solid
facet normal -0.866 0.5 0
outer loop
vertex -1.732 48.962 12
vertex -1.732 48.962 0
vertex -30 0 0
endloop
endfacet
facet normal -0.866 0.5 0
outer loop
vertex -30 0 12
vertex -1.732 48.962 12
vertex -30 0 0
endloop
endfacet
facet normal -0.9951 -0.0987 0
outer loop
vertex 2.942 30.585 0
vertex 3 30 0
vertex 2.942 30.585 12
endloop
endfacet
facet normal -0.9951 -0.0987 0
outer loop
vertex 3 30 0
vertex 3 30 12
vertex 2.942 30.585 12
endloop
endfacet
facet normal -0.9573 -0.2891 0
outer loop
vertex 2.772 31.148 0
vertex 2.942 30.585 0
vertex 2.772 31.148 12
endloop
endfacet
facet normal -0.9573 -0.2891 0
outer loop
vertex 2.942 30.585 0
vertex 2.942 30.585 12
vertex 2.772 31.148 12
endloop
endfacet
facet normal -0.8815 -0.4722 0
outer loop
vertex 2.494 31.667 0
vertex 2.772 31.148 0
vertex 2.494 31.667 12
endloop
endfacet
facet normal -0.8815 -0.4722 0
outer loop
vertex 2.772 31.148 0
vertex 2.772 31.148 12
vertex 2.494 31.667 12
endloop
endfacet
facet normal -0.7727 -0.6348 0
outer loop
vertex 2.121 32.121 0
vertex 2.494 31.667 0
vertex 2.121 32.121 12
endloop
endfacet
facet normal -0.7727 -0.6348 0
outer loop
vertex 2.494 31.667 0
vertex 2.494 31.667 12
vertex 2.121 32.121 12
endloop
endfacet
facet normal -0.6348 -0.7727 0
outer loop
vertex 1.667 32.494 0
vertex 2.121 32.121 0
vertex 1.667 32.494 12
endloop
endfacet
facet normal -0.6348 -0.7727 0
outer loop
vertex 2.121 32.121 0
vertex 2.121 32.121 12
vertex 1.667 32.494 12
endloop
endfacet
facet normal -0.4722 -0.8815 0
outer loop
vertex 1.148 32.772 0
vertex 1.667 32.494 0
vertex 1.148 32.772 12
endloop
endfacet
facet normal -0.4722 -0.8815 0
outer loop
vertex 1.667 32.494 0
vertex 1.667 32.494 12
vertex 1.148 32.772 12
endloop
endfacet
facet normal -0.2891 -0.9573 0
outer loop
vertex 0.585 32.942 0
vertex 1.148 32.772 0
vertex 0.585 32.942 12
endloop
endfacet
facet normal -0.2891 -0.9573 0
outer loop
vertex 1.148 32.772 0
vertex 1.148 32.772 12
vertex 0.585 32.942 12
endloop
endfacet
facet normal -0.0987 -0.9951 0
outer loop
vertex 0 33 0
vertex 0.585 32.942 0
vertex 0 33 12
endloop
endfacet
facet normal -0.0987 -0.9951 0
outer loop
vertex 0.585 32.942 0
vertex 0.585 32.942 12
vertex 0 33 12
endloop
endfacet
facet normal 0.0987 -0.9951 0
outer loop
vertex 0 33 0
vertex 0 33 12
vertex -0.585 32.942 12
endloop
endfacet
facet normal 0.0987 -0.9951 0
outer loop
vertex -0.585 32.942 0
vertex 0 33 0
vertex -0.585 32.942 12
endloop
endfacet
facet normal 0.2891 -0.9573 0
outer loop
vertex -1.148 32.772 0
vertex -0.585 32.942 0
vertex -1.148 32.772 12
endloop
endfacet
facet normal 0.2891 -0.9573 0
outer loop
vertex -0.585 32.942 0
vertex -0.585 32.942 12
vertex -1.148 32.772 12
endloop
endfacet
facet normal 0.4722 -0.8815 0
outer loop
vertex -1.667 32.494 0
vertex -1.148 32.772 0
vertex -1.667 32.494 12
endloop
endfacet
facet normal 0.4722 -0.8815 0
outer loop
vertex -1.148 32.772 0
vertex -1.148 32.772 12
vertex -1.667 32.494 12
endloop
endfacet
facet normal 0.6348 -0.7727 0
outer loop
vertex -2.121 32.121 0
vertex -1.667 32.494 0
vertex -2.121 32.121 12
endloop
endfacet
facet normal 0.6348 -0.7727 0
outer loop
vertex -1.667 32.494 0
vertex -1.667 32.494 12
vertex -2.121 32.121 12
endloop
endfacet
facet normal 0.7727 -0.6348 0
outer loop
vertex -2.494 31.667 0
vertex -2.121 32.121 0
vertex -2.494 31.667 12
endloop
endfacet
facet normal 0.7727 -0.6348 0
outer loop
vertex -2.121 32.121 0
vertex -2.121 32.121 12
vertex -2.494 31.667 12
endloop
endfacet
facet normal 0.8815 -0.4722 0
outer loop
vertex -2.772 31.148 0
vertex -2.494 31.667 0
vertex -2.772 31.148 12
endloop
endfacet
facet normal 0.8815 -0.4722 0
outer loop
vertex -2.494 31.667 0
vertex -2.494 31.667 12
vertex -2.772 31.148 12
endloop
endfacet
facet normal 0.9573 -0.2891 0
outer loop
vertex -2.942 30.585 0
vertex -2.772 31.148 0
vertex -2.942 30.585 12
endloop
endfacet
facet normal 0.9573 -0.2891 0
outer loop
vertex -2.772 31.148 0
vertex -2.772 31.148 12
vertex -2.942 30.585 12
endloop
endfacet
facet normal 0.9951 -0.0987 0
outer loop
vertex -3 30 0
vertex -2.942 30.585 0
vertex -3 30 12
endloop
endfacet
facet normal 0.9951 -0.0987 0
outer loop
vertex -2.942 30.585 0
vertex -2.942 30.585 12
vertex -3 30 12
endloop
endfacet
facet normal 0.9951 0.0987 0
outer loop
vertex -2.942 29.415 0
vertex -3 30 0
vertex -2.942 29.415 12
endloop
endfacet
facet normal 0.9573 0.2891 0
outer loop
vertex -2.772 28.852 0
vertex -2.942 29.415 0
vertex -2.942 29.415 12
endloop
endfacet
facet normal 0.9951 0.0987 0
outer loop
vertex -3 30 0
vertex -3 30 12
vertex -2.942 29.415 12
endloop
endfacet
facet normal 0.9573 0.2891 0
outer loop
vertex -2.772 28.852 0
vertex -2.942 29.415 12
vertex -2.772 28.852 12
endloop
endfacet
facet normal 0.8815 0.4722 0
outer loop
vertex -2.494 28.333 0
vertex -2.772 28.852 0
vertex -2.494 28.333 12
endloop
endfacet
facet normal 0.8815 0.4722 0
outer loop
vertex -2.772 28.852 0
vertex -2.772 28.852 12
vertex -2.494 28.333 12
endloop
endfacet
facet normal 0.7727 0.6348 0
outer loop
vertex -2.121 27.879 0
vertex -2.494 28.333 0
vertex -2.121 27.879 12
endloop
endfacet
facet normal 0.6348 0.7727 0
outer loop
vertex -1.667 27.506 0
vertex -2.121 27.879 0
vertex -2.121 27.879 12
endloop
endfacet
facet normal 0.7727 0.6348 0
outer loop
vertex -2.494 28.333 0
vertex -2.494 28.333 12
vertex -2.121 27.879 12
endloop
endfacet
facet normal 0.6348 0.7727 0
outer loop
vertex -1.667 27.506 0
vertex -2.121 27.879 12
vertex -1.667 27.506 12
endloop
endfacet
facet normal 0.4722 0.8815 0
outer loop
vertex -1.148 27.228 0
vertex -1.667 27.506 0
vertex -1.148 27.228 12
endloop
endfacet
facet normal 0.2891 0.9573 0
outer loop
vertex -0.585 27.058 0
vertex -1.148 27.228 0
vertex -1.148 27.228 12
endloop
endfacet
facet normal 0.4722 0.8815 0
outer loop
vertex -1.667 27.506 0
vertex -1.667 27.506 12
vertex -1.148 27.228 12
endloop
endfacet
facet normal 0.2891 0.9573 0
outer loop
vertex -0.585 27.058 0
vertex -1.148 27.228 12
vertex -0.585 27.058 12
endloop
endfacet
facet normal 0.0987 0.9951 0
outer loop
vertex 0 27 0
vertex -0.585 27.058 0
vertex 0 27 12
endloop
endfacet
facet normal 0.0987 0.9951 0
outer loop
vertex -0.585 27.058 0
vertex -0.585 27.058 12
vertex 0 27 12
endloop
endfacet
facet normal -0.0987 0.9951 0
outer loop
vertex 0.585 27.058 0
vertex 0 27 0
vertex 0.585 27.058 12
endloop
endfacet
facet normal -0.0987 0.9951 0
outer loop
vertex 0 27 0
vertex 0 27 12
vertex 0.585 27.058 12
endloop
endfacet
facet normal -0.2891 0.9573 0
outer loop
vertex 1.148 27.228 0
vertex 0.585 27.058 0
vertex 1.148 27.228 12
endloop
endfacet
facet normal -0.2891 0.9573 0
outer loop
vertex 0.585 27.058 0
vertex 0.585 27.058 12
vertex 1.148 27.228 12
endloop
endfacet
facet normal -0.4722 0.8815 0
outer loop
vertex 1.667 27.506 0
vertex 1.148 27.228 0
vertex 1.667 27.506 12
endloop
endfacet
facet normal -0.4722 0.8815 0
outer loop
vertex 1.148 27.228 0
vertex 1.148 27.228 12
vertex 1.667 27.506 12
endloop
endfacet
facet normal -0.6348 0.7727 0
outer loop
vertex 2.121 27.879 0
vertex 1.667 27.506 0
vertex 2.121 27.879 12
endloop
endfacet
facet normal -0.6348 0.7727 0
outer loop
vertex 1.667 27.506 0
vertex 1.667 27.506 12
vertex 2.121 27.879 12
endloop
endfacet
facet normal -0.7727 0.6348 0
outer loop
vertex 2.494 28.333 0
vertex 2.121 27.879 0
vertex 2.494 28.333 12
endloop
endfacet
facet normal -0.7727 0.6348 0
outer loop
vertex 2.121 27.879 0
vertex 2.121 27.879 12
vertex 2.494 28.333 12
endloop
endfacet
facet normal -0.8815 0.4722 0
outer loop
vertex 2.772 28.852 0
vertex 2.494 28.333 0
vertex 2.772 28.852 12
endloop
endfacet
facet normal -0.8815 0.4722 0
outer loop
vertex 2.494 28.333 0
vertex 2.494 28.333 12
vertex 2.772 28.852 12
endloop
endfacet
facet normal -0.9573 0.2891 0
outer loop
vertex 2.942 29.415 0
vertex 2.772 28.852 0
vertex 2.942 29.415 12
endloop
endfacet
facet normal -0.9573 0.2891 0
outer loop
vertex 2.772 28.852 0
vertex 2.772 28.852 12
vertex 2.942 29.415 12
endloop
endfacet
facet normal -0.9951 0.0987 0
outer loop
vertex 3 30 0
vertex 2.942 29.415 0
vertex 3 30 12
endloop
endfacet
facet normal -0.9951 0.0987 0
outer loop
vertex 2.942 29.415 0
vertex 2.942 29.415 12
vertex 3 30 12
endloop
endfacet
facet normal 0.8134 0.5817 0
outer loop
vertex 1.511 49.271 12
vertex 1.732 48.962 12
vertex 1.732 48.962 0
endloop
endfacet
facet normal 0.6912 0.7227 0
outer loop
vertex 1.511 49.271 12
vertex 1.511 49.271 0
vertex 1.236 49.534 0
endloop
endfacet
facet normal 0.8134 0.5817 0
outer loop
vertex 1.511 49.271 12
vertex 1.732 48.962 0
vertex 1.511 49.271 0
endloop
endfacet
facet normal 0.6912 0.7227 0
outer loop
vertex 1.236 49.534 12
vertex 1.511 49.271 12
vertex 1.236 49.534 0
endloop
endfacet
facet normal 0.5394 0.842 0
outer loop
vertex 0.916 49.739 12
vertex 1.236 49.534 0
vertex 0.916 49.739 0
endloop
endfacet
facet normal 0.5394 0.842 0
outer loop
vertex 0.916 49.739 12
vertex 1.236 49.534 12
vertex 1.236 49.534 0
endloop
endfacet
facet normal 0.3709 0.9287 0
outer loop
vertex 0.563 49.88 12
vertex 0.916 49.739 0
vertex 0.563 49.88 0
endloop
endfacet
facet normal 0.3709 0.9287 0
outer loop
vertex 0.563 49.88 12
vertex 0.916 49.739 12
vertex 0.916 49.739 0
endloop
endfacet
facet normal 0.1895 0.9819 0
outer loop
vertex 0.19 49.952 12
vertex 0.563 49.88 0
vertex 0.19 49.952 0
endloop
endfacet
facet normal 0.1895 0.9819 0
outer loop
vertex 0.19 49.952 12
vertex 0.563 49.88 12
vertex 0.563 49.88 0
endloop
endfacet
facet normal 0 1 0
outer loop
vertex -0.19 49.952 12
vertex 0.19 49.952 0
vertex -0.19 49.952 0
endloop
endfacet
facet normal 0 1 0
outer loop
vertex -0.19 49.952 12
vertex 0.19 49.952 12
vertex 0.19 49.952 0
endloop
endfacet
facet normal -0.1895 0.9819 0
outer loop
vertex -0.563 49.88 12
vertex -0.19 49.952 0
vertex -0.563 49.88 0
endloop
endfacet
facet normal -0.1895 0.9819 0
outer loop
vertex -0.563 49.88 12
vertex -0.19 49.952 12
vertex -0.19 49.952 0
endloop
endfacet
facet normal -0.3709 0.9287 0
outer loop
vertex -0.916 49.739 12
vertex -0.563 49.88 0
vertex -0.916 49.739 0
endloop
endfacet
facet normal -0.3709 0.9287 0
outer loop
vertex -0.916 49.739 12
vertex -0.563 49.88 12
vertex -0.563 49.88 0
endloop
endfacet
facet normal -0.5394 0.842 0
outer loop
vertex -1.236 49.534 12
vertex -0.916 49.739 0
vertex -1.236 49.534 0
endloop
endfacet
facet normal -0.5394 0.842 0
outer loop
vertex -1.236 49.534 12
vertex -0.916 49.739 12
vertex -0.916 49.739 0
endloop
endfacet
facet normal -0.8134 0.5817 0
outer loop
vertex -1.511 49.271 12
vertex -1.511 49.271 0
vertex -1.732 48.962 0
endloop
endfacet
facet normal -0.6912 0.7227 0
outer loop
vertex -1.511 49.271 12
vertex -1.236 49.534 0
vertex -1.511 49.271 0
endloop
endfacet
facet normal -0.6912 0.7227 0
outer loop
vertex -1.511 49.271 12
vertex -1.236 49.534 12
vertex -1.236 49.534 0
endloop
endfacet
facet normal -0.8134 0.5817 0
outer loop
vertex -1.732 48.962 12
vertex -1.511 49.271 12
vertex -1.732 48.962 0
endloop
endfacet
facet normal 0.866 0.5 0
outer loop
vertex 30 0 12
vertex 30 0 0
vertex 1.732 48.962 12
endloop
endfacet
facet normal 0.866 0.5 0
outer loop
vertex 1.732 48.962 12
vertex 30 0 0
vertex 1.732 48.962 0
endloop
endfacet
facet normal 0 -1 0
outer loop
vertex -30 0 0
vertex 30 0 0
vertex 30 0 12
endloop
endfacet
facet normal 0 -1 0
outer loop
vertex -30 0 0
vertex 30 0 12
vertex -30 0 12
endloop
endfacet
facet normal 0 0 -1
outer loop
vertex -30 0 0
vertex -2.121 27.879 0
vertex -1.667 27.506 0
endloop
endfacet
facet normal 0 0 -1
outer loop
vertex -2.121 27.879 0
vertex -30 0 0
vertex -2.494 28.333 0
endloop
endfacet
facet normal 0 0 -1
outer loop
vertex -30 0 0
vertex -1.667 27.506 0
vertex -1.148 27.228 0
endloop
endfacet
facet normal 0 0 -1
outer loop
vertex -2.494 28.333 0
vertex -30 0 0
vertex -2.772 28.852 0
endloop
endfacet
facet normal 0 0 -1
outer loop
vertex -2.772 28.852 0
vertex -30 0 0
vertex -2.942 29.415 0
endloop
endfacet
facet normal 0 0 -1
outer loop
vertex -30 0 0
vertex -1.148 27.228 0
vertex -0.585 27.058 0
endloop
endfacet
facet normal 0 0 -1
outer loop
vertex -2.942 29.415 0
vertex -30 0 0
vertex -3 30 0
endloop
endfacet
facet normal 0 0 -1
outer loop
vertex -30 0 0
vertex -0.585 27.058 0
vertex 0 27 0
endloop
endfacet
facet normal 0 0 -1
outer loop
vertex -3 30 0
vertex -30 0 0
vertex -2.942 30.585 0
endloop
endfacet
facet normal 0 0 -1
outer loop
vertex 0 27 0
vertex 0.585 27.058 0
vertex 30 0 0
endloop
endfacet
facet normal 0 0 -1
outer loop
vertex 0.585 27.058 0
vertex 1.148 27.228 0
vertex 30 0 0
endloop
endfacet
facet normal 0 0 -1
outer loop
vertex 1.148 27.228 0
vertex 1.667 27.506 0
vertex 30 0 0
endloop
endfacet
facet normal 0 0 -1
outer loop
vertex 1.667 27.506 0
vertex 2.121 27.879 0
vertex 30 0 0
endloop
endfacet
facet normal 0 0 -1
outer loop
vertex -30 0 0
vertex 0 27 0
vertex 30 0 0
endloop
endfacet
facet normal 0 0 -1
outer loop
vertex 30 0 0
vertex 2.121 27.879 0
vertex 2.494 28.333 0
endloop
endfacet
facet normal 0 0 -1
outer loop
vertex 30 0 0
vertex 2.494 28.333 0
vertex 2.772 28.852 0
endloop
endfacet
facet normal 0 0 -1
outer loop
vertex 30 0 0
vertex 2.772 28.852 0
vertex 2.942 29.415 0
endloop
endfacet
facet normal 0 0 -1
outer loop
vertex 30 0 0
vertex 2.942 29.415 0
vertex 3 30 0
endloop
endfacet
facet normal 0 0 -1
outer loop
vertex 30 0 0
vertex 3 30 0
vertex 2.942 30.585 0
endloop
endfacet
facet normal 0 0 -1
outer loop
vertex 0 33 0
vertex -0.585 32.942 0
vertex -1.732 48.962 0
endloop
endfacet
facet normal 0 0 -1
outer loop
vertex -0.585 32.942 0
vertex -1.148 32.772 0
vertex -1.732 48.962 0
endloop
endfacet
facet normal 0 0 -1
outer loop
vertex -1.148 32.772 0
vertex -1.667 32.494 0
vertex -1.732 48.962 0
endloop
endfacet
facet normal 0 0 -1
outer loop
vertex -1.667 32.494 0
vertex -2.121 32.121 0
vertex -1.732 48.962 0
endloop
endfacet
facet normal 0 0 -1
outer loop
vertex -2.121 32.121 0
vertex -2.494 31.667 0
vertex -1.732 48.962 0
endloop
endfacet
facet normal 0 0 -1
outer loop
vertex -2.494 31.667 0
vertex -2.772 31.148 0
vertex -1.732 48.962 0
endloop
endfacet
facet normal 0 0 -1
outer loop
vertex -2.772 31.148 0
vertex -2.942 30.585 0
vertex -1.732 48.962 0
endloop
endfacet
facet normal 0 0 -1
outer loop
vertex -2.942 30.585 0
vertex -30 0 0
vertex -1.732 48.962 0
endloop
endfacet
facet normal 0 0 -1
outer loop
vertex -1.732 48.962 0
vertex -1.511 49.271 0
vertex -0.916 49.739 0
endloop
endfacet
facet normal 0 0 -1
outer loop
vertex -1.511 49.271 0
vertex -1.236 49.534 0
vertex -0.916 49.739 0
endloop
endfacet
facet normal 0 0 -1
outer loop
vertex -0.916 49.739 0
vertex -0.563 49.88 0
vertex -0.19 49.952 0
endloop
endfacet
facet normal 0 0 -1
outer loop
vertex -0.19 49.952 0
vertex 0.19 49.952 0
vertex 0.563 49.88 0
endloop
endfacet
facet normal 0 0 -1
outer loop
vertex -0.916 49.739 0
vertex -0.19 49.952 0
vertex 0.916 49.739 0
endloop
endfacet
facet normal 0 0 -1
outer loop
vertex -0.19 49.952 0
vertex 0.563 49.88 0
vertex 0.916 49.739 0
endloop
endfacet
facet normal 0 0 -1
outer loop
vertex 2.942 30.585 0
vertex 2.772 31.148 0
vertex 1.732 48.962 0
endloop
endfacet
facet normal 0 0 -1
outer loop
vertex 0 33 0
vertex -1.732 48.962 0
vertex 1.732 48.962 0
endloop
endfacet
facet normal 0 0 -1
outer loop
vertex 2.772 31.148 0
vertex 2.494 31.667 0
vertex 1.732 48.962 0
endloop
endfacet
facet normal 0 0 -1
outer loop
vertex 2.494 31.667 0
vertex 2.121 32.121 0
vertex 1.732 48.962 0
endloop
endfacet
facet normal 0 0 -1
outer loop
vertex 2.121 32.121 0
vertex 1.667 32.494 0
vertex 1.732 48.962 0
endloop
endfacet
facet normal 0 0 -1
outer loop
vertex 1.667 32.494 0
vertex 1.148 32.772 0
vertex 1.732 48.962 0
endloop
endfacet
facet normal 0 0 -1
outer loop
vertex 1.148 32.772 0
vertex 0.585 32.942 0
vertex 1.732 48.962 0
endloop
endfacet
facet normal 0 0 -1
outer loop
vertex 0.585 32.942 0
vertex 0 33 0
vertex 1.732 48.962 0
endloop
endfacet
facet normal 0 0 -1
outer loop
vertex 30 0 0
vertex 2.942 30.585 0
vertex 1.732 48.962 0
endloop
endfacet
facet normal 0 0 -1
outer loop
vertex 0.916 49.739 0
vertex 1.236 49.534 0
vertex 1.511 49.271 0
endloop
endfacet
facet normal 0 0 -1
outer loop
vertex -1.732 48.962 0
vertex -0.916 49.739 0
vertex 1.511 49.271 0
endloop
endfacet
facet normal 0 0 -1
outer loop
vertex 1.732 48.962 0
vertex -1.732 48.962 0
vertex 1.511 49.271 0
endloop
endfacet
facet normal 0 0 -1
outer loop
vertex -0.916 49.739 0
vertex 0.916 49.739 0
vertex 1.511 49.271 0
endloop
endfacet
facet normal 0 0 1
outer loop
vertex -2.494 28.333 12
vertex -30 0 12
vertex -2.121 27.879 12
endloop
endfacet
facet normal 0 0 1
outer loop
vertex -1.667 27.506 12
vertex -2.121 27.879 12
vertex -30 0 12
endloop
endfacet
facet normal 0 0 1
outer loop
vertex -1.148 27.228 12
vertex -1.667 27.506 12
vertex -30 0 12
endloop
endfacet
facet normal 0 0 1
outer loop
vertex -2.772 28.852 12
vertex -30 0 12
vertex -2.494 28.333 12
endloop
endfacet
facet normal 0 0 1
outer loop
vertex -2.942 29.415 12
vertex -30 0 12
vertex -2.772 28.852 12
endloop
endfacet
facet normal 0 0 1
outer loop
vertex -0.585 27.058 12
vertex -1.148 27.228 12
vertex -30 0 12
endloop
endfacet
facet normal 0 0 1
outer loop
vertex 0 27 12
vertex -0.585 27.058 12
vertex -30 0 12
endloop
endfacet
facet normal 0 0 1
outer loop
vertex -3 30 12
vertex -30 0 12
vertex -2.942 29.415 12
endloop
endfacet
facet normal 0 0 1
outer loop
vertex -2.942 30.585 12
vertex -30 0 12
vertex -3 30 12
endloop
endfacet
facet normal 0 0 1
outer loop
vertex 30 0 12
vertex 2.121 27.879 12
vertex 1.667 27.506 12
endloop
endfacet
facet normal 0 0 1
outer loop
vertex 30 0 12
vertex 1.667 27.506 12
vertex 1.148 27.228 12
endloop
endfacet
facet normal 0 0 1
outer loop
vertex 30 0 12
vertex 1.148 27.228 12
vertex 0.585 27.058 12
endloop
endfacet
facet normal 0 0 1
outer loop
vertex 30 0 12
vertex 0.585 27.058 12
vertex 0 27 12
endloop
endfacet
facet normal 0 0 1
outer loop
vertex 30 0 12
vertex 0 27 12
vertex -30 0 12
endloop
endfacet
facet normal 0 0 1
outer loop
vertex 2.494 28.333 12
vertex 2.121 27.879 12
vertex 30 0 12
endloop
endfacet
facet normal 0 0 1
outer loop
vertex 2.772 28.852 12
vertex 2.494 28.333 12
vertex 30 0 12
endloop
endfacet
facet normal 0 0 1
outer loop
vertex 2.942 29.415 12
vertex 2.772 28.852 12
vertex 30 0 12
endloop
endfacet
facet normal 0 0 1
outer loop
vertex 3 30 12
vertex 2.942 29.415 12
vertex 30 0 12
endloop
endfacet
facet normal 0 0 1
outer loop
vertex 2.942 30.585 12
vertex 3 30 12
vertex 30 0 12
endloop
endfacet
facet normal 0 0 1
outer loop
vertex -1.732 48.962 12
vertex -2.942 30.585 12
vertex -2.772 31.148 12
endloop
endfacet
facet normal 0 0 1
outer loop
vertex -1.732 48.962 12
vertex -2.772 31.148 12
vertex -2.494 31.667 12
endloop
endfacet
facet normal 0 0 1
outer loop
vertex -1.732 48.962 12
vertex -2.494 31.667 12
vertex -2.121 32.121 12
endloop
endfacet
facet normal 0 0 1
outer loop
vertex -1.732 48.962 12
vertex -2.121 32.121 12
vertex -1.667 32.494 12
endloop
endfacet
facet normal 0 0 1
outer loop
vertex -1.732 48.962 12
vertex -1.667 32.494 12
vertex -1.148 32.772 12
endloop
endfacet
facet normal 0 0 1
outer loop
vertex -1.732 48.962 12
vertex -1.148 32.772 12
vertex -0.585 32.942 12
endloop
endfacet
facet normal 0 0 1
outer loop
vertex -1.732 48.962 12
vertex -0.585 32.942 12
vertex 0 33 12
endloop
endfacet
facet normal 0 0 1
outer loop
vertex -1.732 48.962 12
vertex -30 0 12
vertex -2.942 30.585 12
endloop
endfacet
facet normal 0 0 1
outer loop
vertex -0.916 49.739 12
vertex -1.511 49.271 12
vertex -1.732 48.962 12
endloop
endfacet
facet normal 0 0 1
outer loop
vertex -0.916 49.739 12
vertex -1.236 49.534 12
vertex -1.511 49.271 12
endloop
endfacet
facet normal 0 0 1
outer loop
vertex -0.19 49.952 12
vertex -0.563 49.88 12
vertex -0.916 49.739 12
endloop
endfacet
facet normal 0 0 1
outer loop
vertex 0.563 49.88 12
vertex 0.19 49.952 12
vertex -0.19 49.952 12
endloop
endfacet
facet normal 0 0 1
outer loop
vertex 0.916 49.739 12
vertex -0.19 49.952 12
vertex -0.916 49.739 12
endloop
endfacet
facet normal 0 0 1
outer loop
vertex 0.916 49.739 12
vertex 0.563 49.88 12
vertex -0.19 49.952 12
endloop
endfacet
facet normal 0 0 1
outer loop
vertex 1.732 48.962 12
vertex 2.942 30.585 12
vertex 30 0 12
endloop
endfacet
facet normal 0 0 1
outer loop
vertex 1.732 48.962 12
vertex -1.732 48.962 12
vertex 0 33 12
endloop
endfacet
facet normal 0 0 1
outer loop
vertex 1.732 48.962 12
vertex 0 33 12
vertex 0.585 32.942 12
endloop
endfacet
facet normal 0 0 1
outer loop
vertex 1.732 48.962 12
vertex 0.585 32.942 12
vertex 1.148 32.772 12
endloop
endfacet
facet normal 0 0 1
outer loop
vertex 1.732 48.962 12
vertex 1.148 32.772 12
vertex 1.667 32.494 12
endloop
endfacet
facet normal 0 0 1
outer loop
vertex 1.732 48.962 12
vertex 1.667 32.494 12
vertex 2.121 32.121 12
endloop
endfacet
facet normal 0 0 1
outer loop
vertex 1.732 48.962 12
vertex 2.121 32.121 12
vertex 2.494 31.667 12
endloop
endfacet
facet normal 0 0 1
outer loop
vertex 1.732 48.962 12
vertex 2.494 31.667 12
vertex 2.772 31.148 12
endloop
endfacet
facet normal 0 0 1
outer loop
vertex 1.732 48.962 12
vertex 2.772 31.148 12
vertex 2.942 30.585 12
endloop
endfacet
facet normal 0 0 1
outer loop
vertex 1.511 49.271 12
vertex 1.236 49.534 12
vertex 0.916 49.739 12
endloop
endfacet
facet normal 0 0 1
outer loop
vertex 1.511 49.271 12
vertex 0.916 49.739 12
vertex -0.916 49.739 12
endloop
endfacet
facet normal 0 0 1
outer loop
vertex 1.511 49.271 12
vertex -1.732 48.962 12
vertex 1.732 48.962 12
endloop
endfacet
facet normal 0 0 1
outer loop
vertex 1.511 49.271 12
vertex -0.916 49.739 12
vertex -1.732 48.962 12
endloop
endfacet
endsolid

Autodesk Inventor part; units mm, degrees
ref_plane "YZ Plane" through (0, 0, 0) normal (1, 0, 0) x (0, 1, 0)
ref_plane "XZ Plane" through (0, 0, 0) normal (0, 1, 0) x (-1, 0, 0)
ref_plane "XY Plane" through (0, 0, 0) normal (0, 0, 1) x (1, 0, 0)
sketch "Sketch1" plane through (0, 0, 0) normal (0, 0, 1) x (1, 0, 0)
  line L0 (0, 0) -> (-30, 0)
  line L1 (0, 0) -> (30, 0)
  line L2 (30, 0) -> (0, 51.9615)
  line L3 (0, 51.9615) -> (-30, 0)
  dimension "d0" = 30
  dimension "d1" = 30
  dimension "d2" = 60
  dimension "d3" = 60
extrude "Extrusion1" add sketch "Sketch1" along normal blind 12
sketch "Sketch2" plane through (0, 0, 12) normal (0, 0, 1) x (1, 0, 0)
  line L0 (0, 0) -> (0, 30)
  circle A0 centre (0, 30) radius 3
  dimension "d7" = 30
  dimension "d8" = 6
extrude "Extrusion2" cut sketch "Sketch2" against normal through all
fillet "Fillet2" radius 2 1 edges at (0, 51.9615, 6)
properties part number "Rocker Base Joint"
